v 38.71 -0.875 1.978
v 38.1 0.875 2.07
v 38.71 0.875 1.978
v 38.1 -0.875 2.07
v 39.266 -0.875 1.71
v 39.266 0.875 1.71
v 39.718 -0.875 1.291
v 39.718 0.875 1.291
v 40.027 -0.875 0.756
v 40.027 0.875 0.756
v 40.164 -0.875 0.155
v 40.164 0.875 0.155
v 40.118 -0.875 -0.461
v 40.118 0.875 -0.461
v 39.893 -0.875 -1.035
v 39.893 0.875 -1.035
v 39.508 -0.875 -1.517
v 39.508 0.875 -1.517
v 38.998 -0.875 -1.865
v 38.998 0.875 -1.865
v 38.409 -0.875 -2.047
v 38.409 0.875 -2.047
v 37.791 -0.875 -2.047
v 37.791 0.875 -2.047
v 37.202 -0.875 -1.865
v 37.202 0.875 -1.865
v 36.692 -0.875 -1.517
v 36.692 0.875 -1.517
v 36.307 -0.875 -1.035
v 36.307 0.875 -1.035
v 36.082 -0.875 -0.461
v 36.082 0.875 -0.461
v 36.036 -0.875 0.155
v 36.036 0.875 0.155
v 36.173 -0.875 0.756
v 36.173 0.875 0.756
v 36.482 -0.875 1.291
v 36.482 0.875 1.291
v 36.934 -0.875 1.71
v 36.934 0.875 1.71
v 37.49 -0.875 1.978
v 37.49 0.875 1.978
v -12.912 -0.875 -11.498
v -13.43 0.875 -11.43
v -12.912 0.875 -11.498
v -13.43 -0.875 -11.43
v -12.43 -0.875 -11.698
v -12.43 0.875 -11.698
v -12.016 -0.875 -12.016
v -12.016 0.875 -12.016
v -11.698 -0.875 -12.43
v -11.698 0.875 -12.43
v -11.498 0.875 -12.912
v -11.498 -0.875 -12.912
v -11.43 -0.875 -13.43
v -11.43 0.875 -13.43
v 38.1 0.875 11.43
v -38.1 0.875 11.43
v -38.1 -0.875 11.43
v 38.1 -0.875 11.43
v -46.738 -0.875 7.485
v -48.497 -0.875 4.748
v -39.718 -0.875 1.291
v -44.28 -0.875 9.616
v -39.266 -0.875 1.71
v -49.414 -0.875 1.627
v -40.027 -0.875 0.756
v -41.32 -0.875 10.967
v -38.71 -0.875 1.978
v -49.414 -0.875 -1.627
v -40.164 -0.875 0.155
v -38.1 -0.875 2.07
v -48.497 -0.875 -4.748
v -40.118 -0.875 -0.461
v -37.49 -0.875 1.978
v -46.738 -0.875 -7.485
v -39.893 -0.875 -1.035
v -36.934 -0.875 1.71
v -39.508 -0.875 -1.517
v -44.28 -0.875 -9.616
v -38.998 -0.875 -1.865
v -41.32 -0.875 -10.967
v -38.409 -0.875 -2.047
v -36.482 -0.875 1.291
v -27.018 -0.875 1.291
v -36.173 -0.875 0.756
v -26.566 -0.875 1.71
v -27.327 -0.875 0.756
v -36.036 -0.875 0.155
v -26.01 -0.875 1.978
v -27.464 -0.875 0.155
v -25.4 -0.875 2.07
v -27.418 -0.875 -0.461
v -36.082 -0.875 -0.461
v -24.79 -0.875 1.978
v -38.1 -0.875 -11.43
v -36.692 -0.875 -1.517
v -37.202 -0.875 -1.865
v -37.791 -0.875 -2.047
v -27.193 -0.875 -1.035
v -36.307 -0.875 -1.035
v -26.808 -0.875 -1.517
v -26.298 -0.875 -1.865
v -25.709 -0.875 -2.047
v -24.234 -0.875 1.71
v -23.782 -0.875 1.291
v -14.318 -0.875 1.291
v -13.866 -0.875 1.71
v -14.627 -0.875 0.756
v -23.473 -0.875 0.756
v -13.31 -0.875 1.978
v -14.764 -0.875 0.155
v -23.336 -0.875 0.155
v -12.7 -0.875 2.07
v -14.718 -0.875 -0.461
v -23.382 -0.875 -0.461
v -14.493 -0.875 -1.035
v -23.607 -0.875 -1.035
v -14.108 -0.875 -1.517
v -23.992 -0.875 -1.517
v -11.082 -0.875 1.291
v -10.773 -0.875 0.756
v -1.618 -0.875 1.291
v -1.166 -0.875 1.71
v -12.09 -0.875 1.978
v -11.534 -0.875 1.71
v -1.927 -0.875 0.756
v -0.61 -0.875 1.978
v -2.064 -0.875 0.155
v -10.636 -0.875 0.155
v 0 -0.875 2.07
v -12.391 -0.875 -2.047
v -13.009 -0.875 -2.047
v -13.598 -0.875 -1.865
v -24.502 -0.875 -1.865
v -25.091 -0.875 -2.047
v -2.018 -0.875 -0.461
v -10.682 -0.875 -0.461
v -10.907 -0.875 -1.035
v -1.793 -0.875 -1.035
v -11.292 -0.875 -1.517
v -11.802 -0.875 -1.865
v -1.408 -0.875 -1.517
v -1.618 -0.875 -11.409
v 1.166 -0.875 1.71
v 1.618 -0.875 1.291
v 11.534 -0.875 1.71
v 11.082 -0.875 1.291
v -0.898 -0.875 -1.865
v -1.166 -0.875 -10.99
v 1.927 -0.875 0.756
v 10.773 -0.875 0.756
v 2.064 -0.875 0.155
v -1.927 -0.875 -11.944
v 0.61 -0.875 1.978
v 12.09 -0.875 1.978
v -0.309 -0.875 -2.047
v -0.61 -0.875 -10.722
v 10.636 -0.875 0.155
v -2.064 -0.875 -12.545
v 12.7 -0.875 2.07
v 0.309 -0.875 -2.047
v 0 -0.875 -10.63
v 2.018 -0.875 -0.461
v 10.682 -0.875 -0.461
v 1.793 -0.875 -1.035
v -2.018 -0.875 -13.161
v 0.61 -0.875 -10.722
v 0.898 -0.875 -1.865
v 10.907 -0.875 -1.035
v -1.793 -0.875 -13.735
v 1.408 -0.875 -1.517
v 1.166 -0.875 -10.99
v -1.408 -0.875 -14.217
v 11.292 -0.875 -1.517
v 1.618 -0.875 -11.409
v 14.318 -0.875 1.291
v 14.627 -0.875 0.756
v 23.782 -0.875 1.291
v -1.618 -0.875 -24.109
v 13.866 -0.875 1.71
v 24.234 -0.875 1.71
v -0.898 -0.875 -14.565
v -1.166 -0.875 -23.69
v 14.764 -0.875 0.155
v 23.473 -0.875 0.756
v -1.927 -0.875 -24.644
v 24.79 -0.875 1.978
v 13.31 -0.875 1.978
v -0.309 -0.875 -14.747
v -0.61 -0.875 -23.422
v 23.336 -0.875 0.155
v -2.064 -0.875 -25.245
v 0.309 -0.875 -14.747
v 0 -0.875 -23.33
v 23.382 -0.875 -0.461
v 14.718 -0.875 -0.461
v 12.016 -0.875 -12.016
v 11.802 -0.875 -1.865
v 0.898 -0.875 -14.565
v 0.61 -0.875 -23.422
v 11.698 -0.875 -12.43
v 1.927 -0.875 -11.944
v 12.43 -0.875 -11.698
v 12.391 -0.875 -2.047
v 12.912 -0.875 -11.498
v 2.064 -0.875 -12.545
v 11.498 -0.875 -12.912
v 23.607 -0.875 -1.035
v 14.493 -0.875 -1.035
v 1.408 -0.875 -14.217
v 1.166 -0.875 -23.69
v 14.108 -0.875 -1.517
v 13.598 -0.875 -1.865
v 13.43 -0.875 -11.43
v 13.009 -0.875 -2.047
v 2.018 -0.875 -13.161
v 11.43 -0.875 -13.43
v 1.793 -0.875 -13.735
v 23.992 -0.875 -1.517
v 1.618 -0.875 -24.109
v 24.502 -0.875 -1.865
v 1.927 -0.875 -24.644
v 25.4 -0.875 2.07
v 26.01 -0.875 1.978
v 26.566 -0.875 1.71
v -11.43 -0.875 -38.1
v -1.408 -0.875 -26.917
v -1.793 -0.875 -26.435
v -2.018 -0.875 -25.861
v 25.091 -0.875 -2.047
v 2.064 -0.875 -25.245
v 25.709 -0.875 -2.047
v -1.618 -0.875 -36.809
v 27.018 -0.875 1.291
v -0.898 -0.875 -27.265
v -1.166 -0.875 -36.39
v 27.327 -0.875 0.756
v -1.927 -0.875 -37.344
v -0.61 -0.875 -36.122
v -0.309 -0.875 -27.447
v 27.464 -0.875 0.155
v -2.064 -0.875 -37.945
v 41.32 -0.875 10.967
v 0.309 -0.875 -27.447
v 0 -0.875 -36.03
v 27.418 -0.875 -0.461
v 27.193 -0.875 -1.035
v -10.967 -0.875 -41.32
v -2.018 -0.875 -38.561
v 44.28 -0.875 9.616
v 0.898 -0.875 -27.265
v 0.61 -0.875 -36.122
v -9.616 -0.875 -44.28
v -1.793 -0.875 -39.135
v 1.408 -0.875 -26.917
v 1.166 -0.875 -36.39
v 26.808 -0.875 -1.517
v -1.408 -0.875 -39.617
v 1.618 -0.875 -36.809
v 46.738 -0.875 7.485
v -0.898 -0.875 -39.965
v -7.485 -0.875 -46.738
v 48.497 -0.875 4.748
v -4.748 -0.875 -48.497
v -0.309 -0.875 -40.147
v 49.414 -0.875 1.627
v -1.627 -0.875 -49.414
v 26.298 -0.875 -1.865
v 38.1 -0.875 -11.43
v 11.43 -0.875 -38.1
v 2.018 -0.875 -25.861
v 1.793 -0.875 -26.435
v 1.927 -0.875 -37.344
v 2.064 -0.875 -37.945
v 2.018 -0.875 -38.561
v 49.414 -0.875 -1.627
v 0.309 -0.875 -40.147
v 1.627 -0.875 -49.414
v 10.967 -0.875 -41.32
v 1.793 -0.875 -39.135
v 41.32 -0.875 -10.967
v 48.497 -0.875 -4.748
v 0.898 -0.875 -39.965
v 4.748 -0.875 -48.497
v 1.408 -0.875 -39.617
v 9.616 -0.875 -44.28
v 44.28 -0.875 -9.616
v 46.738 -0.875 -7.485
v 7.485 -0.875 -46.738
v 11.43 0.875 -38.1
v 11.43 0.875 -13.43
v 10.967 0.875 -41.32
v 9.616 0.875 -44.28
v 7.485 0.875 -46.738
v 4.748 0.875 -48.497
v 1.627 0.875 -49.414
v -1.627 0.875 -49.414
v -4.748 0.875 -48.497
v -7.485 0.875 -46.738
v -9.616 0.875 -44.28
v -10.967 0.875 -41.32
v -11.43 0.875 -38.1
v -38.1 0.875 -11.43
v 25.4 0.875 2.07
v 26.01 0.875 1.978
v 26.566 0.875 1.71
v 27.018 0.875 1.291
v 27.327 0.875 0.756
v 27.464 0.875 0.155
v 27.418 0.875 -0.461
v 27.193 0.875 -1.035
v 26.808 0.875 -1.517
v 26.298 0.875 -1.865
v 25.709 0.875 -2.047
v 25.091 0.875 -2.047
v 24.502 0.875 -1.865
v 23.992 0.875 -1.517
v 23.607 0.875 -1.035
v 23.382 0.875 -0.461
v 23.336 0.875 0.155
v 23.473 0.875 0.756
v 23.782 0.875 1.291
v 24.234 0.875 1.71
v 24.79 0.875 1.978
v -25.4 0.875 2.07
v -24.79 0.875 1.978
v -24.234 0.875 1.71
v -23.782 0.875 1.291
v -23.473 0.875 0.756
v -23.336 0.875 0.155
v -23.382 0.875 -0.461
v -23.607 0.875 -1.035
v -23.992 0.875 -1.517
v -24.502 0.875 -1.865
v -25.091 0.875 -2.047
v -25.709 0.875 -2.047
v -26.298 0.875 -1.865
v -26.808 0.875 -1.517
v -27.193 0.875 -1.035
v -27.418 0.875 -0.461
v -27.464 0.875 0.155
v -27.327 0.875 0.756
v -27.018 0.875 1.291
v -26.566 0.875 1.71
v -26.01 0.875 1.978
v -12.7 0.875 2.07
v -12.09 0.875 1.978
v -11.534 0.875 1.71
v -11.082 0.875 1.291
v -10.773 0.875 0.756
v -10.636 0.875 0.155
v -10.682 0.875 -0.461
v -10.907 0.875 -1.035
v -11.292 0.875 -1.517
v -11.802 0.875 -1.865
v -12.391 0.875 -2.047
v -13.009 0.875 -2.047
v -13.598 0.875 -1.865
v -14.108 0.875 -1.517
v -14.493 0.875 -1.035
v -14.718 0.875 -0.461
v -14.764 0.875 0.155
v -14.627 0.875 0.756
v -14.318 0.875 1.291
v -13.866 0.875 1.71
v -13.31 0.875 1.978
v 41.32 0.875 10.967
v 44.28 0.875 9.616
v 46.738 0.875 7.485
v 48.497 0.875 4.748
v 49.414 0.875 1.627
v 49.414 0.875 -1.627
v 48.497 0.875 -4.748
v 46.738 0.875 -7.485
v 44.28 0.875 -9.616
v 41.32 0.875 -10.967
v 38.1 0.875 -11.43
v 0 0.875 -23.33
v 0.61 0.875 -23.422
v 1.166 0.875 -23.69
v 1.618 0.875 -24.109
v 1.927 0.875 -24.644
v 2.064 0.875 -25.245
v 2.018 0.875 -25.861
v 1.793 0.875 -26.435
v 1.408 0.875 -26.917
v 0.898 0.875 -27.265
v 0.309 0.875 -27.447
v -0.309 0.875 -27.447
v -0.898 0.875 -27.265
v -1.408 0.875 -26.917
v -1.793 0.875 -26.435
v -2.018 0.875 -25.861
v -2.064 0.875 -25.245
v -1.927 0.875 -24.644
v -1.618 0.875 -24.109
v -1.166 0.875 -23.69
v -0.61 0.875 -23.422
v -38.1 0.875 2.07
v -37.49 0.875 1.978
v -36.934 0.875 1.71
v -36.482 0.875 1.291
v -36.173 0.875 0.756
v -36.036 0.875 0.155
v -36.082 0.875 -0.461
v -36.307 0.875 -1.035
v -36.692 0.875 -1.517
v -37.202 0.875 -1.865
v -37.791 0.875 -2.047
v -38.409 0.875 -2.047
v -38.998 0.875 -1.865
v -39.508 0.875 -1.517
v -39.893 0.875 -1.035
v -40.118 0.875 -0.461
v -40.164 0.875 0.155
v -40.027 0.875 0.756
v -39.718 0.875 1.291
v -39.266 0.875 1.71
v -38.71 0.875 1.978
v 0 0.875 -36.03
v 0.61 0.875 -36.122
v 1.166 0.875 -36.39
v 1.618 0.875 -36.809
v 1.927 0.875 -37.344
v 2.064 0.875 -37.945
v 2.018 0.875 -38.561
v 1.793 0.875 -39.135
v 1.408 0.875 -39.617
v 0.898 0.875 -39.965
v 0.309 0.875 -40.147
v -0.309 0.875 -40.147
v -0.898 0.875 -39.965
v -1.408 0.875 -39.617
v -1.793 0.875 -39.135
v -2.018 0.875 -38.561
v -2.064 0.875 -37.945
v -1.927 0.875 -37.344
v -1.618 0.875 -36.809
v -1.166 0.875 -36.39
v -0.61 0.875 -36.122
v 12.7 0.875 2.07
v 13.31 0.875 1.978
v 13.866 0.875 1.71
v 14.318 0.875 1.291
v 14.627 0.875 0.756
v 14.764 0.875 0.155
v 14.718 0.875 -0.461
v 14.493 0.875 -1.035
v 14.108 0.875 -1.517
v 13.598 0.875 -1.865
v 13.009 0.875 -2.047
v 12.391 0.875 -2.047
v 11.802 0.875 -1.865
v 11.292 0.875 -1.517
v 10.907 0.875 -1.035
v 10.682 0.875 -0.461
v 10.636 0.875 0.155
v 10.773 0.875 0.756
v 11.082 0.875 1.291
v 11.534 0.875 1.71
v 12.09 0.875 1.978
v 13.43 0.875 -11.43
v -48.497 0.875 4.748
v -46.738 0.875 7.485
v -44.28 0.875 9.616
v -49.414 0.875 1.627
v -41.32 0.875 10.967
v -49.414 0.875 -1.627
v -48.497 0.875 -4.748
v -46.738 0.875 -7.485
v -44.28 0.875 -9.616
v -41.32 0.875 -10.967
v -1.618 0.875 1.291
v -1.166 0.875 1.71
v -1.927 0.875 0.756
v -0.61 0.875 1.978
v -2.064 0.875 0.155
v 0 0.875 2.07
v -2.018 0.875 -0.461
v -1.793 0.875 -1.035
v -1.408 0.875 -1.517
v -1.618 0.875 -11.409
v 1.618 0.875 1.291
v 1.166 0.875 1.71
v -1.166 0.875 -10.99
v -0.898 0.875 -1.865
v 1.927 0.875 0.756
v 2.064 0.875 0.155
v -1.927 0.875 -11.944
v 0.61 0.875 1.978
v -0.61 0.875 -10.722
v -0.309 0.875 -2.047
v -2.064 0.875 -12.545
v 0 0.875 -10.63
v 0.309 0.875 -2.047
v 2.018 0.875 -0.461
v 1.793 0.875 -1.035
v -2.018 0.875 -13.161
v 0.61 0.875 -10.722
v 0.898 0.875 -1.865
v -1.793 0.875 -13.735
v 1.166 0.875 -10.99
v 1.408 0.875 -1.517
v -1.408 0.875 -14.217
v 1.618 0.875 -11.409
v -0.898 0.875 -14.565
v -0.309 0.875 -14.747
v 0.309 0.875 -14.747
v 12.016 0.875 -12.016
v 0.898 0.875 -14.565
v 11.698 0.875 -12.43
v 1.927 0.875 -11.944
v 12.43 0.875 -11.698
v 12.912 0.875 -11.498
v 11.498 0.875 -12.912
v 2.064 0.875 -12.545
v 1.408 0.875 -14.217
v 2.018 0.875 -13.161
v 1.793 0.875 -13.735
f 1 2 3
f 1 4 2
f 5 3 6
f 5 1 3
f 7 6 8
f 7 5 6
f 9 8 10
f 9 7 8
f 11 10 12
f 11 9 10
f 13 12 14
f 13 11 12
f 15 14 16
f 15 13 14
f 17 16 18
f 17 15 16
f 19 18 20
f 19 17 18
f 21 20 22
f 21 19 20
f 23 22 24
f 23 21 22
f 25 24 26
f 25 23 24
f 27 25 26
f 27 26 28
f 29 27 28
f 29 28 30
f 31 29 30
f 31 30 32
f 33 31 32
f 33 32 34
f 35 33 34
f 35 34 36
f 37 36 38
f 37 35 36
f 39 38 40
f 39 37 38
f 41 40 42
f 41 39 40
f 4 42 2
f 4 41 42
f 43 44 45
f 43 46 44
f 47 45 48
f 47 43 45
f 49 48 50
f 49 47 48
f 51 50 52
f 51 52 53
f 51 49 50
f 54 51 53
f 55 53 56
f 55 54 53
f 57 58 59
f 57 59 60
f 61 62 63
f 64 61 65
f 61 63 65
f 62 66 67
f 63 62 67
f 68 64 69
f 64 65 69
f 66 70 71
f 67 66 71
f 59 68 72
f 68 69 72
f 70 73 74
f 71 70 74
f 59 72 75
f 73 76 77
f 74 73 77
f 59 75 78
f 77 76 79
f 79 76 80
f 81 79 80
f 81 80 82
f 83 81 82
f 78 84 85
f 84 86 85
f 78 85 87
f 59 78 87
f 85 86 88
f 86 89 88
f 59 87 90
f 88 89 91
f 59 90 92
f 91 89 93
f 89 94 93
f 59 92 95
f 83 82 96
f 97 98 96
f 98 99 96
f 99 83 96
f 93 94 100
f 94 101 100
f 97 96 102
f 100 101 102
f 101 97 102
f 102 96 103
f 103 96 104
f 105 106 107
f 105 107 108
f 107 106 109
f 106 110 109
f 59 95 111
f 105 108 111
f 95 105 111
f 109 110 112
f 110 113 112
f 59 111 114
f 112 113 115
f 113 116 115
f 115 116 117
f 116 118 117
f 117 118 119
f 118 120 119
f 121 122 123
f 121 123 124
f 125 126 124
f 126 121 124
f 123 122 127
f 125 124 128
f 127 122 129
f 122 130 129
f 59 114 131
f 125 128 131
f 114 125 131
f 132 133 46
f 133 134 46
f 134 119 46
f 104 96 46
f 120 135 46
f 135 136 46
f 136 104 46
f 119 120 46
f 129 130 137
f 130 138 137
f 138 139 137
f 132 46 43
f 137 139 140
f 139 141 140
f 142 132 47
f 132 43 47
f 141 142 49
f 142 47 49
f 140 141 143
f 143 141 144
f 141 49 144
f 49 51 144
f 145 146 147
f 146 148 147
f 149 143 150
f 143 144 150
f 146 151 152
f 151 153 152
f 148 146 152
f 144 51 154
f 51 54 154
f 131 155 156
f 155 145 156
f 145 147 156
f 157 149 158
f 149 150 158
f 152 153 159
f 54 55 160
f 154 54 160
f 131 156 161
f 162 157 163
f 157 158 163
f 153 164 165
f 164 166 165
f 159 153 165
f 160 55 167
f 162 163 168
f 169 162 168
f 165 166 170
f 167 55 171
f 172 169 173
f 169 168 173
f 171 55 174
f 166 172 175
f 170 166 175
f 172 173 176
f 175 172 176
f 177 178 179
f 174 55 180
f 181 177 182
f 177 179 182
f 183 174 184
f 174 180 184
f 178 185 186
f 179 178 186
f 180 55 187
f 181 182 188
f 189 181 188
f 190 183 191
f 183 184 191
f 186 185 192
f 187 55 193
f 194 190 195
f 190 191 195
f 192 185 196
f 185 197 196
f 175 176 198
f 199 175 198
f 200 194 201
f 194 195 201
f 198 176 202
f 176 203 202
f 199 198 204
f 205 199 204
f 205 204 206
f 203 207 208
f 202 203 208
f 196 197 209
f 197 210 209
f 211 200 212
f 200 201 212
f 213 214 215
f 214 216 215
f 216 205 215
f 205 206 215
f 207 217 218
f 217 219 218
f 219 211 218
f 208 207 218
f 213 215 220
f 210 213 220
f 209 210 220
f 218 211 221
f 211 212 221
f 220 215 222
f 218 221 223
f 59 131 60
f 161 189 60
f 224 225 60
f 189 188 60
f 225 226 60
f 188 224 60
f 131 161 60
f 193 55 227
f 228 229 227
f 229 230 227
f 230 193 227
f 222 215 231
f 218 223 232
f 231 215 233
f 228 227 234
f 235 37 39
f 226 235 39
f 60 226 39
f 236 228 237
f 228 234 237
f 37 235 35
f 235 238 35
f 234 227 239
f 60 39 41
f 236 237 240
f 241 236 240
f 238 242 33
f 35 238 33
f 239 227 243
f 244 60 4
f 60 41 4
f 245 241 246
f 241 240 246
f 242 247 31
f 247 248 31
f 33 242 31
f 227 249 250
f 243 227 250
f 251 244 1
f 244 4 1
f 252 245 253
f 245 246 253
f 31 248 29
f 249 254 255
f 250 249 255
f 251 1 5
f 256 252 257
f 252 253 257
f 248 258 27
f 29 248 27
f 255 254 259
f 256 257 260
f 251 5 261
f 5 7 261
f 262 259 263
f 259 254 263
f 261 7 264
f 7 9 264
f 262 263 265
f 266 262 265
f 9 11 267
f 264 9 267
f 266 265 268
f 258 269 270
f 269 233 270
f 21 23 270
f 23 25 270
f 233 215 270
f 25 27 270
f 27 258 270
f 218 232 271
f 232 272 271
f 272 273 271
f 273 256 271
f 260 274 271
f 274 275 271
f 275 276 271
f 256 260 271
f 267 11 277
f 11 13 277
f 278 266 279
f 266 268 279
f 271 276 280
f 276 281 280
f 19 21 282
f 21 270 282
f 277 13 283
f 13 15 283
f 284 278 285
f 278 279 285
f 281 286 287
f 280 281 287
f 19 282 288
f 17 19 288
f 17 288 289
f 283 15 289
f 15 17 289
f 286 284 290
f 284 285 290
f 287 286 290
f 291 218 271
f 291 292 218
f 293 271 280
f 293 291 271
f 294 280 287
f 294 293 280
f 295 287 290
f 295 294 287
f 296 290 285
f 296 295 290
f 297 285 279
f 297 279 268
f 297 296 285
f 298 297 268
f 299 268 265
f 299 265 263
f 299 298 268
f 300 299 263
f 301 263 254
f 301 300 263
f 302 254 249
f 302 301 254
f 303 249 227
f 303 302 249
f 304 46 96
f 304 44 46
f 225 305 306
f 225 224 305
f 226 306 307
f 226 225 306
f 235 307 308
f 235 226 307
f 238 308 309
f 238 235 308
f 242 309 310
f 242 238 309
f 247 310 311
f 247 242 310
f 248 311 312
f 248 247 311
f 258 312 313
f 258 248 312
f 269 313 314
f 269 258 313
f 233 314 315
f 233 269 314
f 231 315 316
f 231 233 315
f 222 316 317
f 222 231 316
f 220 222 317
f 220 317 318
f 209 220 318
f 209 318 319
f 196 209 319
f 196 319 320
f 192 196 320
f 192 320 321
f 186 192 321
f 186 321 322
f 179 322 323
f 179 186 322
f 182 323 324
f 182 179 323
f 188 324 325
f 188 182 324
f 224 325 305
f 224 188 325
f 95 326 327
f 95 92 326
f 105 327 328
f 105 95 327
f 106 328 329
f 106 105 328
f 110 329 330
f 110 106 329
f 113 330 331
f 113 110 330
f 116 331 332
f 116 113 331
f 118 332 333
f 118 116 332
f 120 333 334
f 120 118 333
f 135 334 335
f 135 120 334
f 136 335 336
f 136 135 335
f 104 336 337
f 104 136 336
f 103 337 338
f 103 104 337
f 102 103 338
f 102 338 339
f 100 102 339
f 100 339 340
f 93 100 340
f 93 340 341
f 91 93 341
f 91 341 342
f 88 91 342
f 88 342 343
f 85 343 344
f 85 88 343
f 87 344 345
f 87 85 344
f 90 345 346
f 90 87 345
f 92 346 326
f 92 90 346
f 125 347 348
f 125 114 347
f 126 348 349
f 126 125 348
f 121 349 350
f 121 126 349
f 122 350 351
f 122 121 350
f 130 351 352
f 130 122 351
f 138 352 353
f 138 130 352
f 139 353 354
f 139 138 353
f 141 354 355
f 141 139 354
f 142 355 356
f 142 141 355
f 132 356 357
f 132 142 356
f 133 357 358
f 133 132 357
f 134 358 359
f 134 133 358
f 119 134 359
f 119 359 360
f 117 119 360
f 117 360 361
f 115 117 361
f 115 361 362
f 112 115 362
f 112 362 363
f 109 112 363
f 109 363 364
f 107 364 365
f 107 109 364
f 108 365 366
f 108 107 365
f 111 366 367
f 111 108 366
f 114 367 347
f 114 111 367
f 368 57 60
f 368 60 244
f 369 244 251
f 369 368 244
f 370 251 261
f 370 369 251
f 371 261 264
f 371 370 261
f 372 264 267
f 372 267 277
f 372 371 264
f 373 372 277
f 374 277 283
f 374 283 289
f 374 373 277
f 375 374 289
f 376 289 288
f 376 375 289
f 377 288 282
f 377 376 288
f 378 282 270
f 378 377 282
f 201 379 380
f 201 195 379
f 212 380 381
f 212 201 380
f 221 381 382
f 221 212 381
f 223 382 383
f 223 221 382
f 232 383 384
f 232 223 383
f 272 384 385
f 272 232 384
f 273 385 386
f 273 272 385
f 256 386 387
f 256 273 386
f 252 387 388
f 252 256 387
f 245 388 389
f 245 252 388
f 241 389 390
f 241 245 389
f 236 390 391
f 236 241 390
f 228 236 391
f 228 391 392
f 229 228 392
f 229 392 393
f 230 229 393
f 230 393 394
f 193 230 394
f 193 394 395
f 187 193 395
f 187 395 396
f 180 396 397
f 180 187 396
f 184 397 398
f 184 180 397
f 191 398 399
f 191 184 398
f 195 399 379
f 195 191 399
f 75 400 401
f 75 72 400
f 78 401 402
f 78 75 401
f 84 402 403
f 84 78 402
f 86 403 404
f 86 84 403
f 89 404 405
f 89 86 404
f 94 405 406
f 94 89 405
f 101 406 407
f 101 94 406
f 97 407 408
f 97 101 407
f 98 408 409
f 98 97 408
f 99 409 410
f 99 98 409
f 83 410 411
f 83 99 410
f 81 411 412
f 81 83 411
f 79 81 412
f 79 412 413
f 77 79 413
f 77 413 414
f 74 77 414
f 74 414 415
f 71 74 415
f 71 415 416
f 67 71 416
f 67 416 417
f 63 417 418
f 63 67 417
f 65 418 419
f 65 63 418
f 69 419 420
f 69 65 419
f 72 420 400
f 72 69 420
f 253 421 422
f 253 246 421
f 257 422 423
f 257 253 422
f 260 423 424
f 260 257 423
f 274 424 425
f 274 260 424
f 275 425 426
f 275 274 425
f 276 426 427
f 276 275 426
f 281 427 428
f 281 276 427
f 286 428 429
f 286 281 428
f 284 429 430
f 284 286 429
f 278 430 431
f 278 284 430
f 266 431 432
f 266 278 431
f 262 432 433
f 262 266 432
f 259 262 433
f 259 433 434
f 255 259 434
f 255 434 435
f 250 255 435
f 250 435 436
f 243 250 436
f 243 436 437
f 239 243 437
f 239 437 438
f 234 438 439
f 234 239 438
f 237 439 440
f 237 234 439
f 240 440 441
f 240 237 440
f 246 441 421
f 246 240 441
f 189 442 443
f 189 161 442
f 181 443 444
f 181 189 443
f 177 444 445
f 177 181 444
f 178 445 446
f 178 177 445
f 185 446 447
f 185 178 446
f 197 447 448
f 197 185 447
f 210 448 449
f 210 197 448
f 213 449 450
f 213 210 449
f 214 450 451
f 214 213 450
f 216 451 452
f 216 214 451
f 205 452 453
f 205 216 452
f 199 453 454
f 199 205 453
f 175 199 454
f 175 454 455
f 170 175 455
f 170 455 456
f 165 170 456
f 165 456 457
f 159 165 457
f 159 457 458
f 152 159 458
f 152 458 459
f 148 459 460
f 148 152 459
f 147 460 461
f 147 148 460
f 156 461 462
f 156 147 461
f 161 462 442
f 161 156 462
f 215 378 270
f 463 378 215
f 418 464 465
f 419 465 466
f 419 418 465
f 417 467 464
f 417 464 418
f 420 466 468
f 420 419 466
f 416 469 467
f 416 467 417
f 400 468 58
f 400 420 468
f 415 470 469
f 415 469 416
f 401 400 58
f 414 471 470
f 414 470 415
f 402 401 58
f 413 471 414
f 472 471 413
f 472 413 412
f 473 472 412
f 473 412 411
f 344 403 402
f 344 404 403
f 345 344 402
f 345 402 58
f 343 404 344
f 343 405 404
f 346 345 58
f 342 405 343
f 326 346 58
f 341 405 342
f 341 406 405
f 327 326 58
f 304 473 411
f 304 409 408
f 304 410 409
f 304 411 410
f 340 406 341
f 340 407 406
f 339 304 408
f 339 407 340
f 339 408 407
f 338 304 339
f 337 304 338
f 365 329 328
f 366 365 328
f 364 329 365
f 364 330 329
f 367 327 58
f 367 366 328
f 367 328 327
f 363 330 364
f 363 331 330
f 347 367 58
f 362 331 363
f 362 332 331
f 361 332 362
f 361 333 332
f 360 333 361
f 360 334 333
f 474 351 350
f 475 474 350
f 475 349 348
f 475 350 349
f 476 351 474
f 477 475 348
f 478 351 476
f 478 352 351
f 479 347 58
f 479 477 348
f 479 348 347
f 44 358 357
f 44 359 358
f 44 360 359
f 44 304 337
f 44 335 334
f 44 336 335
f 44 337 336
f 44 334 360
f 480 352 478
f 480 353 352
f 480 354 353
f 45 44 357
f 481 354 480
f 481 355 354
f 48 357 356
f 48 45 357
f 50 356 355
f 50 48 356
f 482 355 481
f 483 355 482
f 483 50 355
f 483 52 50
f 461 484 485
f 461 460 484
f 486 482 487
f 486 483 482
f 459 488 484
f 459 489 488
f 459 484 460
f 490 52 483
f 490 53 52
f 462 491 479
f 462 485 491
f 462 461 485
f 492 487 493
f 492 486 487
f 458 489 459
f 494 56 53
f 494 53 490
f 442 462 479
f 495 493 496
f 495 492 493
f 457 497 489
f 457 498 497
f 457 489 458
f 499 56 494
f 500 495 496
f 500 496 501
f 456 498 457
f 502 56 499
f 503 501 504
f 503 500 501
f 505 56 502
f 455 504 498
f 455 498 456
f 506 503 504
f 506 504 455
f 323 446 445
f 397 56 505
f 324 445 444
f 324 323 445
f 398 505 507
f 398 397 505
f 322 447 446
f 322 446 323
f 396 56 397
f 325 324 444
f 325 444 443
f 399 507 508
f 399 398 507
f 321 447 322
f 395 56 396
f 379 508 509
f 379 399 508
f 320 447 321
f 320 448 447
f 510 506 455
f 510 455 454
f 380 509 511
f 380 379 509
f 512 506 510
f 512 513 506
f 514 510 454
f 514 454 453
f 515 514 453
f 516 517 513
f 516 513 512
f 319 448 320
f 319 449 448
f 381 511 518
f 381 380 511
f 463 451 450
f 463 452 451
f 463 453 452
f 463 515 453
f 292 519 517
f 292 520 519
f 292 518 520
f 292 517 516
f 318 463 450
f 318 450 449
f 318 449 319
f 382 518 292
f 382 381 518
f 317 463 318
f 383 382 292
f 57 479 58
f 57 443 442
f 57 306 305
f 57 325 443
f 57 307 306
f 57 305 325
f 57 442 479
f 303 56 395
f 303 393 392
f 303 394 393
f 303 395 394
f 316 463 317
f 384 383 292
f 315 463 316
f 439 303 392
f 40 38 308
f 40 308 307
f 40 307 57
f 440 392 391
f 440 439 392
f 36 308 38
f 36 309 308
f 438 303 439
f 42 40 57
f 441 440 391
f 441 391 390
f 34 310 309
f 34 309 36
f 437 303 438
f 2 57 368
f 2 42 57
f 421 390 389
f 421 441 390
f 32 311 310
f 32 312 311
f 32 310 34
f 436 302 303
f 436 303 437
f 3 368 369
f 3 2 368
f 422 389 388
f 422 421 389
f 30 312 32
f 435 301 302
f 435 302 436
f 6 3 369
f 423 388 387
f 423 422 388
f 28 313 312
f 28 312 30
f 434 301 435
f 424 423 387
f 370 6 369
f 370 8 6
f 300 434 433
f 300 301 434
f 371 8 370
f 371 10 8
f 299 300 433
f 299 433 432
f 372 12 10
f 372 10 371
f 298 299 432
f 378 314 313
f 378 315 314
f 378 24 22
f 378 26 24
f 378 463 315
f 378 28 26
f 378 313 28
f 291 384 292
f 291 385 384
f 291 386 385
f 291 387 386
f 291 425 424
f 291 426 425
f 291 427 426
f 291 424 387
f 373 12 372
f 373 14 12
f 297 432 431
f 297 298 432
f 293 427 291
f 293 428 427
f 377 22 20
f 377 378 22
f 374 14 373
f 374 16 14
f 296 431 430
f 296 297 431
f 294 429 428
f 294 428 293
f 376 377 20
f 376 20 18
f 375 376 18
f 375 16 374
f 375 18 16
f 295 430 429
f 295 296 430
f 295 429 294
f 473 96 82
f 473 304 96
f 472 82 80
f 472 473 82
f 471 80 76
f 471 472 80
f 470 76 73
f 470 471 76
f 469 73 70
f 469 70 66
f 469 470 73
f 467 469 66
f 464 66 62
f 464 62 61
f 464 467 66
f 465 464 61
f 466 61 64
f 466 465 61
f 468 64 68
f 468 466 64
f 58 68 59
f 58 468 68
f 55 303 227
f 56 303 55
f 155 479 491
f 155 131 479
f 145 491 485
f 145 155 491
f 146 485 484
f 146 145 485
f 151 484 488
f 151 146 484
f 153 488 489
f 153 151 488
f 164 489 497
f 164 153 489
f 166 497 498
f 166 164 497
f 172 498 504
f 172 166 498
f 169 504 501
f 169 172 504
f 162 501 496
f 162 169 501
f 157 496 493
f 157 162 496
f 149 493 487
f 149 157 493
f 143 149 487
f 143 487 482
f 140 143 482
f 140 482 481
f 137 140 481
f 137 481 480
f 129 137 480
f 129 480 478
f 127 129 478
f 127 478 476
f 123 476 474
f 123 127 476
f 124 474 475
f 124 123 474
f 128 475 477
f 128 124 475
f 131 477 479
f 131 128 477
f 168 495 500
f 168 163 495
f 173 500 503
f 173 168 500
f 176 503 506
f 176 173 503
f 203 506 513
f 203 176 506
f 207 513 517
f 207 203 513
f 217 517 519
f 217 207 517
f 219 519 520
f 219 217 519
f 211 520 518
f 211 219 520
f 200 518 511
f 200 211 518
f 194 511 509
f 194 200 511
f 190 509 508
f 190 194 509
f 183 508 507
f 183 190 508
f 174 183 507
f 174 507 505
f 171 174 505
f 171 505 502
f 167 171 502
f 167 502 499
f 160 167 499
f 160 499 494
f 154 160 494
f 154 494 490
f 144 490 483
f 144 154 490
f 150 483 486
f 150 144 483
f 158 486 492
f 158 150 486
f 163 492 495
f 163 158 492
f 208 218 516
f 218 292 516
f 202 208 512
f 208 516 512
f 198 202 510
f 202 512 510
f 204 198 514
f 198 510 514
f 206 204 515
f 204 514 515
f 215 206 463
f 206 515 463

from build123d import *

# Parameters (mm, degrees)
SKETCH1_R           = 2.07
BOSS_EXTRUDE1_DEPTH = 0.875
FILLET1_R           = 2


with BuildPart() as part:
    # Sketch1 → Boss-Extrude1 (new, symmetric)
    with BuildSketch(Plane(origin=(0, 0, 0), x_dir=(1, 0, 0), z_dir=(0, 1, 0))):
        with BuildLine():
            ThreePointArc((-38.1, 11.43), (-49.53, 0), (-38.1, -11.43))
            Line((-38.1, -11.43), (38.1, -11.43))
            ThreePointArc((38.1, -11.43), (49.53, 0), (38.1, 11.43))
            Line((38.1, 11.43), (11.43, 11.43))
            Line((11.43, 11.43), (11.43, 38.1))
            ThreePointArc((11.43, 38.1), (0, 49.53), (-11.43, 38.1))
            Line((-11.43, 38.1), (-11.43, 11.43))
            Line((-11.43, 11.43), (-38.1, 11.43))
        make_face()
        with Locations(Location((-25.4, 0, 0), (0, 0, 270))):
            Circle(SKETCH1_R, mode=Mode.SUBTRACT)
        with Locations(Location((0, 25.4, 0), (0, 0, 270))):
            Circle(SKETCH1_R, mode=Mode.SUBTRACT)
        with Locations(Location((0, 12.7, 0), (0, 0, 270))):
            Circle(SKETCH1_R, mode=Mode.SUBTRACT)
        with Locations(Location((25.4, 0, 0), (0, 0, 270))):
            Circle(SKETCH1_R, mode=Mode.SUBTRACT)
        with Locations(Location((-12.7, 0, 0), (0, 0, 270))):
            Circle(SKETCH1_R, mode=Mode.SUBTRACT)
        with Locations(Location((0, 0, 0), (0, 0, 270))):
            Circle(SKETCH1_R, mode=Mode.SUBTRACT)
        with Locations(Location((12.7, 0, 0), (0, 0, 270))):
            Circle(SKETCH1_R, mode=Mode.SUBTRACT)
        with Locations(Location((-38.1, 0, 0), (0, 0, 270))):
            Circle(SKETCH1_R, mode=Mode.SUBTRACT)
        with Locations(Location((38.1, 0, 0), (0, 0, 270))):
            Circle(SKETCH1_R, mode=Mode.SUBTRACT)
        with Locations(Location((0, 38.1, 0), (0, 0, 270))):
            Circle(SKETCH1_R, mode=Mode.SUBTRACT)
    extrude(amount=BOSS_EXTRUDE1_DEPTH, both=True)

    # Fillet1
    fillet1_edges = [part.edges().sort_by_distance(p)[0] for p in [
        (11.43, 0, -11.43),
        (-11.43, 0, -11.43),
    ]]
    fillet(fillet1_edges, radius=FILLET1_R)


solid = part.part
